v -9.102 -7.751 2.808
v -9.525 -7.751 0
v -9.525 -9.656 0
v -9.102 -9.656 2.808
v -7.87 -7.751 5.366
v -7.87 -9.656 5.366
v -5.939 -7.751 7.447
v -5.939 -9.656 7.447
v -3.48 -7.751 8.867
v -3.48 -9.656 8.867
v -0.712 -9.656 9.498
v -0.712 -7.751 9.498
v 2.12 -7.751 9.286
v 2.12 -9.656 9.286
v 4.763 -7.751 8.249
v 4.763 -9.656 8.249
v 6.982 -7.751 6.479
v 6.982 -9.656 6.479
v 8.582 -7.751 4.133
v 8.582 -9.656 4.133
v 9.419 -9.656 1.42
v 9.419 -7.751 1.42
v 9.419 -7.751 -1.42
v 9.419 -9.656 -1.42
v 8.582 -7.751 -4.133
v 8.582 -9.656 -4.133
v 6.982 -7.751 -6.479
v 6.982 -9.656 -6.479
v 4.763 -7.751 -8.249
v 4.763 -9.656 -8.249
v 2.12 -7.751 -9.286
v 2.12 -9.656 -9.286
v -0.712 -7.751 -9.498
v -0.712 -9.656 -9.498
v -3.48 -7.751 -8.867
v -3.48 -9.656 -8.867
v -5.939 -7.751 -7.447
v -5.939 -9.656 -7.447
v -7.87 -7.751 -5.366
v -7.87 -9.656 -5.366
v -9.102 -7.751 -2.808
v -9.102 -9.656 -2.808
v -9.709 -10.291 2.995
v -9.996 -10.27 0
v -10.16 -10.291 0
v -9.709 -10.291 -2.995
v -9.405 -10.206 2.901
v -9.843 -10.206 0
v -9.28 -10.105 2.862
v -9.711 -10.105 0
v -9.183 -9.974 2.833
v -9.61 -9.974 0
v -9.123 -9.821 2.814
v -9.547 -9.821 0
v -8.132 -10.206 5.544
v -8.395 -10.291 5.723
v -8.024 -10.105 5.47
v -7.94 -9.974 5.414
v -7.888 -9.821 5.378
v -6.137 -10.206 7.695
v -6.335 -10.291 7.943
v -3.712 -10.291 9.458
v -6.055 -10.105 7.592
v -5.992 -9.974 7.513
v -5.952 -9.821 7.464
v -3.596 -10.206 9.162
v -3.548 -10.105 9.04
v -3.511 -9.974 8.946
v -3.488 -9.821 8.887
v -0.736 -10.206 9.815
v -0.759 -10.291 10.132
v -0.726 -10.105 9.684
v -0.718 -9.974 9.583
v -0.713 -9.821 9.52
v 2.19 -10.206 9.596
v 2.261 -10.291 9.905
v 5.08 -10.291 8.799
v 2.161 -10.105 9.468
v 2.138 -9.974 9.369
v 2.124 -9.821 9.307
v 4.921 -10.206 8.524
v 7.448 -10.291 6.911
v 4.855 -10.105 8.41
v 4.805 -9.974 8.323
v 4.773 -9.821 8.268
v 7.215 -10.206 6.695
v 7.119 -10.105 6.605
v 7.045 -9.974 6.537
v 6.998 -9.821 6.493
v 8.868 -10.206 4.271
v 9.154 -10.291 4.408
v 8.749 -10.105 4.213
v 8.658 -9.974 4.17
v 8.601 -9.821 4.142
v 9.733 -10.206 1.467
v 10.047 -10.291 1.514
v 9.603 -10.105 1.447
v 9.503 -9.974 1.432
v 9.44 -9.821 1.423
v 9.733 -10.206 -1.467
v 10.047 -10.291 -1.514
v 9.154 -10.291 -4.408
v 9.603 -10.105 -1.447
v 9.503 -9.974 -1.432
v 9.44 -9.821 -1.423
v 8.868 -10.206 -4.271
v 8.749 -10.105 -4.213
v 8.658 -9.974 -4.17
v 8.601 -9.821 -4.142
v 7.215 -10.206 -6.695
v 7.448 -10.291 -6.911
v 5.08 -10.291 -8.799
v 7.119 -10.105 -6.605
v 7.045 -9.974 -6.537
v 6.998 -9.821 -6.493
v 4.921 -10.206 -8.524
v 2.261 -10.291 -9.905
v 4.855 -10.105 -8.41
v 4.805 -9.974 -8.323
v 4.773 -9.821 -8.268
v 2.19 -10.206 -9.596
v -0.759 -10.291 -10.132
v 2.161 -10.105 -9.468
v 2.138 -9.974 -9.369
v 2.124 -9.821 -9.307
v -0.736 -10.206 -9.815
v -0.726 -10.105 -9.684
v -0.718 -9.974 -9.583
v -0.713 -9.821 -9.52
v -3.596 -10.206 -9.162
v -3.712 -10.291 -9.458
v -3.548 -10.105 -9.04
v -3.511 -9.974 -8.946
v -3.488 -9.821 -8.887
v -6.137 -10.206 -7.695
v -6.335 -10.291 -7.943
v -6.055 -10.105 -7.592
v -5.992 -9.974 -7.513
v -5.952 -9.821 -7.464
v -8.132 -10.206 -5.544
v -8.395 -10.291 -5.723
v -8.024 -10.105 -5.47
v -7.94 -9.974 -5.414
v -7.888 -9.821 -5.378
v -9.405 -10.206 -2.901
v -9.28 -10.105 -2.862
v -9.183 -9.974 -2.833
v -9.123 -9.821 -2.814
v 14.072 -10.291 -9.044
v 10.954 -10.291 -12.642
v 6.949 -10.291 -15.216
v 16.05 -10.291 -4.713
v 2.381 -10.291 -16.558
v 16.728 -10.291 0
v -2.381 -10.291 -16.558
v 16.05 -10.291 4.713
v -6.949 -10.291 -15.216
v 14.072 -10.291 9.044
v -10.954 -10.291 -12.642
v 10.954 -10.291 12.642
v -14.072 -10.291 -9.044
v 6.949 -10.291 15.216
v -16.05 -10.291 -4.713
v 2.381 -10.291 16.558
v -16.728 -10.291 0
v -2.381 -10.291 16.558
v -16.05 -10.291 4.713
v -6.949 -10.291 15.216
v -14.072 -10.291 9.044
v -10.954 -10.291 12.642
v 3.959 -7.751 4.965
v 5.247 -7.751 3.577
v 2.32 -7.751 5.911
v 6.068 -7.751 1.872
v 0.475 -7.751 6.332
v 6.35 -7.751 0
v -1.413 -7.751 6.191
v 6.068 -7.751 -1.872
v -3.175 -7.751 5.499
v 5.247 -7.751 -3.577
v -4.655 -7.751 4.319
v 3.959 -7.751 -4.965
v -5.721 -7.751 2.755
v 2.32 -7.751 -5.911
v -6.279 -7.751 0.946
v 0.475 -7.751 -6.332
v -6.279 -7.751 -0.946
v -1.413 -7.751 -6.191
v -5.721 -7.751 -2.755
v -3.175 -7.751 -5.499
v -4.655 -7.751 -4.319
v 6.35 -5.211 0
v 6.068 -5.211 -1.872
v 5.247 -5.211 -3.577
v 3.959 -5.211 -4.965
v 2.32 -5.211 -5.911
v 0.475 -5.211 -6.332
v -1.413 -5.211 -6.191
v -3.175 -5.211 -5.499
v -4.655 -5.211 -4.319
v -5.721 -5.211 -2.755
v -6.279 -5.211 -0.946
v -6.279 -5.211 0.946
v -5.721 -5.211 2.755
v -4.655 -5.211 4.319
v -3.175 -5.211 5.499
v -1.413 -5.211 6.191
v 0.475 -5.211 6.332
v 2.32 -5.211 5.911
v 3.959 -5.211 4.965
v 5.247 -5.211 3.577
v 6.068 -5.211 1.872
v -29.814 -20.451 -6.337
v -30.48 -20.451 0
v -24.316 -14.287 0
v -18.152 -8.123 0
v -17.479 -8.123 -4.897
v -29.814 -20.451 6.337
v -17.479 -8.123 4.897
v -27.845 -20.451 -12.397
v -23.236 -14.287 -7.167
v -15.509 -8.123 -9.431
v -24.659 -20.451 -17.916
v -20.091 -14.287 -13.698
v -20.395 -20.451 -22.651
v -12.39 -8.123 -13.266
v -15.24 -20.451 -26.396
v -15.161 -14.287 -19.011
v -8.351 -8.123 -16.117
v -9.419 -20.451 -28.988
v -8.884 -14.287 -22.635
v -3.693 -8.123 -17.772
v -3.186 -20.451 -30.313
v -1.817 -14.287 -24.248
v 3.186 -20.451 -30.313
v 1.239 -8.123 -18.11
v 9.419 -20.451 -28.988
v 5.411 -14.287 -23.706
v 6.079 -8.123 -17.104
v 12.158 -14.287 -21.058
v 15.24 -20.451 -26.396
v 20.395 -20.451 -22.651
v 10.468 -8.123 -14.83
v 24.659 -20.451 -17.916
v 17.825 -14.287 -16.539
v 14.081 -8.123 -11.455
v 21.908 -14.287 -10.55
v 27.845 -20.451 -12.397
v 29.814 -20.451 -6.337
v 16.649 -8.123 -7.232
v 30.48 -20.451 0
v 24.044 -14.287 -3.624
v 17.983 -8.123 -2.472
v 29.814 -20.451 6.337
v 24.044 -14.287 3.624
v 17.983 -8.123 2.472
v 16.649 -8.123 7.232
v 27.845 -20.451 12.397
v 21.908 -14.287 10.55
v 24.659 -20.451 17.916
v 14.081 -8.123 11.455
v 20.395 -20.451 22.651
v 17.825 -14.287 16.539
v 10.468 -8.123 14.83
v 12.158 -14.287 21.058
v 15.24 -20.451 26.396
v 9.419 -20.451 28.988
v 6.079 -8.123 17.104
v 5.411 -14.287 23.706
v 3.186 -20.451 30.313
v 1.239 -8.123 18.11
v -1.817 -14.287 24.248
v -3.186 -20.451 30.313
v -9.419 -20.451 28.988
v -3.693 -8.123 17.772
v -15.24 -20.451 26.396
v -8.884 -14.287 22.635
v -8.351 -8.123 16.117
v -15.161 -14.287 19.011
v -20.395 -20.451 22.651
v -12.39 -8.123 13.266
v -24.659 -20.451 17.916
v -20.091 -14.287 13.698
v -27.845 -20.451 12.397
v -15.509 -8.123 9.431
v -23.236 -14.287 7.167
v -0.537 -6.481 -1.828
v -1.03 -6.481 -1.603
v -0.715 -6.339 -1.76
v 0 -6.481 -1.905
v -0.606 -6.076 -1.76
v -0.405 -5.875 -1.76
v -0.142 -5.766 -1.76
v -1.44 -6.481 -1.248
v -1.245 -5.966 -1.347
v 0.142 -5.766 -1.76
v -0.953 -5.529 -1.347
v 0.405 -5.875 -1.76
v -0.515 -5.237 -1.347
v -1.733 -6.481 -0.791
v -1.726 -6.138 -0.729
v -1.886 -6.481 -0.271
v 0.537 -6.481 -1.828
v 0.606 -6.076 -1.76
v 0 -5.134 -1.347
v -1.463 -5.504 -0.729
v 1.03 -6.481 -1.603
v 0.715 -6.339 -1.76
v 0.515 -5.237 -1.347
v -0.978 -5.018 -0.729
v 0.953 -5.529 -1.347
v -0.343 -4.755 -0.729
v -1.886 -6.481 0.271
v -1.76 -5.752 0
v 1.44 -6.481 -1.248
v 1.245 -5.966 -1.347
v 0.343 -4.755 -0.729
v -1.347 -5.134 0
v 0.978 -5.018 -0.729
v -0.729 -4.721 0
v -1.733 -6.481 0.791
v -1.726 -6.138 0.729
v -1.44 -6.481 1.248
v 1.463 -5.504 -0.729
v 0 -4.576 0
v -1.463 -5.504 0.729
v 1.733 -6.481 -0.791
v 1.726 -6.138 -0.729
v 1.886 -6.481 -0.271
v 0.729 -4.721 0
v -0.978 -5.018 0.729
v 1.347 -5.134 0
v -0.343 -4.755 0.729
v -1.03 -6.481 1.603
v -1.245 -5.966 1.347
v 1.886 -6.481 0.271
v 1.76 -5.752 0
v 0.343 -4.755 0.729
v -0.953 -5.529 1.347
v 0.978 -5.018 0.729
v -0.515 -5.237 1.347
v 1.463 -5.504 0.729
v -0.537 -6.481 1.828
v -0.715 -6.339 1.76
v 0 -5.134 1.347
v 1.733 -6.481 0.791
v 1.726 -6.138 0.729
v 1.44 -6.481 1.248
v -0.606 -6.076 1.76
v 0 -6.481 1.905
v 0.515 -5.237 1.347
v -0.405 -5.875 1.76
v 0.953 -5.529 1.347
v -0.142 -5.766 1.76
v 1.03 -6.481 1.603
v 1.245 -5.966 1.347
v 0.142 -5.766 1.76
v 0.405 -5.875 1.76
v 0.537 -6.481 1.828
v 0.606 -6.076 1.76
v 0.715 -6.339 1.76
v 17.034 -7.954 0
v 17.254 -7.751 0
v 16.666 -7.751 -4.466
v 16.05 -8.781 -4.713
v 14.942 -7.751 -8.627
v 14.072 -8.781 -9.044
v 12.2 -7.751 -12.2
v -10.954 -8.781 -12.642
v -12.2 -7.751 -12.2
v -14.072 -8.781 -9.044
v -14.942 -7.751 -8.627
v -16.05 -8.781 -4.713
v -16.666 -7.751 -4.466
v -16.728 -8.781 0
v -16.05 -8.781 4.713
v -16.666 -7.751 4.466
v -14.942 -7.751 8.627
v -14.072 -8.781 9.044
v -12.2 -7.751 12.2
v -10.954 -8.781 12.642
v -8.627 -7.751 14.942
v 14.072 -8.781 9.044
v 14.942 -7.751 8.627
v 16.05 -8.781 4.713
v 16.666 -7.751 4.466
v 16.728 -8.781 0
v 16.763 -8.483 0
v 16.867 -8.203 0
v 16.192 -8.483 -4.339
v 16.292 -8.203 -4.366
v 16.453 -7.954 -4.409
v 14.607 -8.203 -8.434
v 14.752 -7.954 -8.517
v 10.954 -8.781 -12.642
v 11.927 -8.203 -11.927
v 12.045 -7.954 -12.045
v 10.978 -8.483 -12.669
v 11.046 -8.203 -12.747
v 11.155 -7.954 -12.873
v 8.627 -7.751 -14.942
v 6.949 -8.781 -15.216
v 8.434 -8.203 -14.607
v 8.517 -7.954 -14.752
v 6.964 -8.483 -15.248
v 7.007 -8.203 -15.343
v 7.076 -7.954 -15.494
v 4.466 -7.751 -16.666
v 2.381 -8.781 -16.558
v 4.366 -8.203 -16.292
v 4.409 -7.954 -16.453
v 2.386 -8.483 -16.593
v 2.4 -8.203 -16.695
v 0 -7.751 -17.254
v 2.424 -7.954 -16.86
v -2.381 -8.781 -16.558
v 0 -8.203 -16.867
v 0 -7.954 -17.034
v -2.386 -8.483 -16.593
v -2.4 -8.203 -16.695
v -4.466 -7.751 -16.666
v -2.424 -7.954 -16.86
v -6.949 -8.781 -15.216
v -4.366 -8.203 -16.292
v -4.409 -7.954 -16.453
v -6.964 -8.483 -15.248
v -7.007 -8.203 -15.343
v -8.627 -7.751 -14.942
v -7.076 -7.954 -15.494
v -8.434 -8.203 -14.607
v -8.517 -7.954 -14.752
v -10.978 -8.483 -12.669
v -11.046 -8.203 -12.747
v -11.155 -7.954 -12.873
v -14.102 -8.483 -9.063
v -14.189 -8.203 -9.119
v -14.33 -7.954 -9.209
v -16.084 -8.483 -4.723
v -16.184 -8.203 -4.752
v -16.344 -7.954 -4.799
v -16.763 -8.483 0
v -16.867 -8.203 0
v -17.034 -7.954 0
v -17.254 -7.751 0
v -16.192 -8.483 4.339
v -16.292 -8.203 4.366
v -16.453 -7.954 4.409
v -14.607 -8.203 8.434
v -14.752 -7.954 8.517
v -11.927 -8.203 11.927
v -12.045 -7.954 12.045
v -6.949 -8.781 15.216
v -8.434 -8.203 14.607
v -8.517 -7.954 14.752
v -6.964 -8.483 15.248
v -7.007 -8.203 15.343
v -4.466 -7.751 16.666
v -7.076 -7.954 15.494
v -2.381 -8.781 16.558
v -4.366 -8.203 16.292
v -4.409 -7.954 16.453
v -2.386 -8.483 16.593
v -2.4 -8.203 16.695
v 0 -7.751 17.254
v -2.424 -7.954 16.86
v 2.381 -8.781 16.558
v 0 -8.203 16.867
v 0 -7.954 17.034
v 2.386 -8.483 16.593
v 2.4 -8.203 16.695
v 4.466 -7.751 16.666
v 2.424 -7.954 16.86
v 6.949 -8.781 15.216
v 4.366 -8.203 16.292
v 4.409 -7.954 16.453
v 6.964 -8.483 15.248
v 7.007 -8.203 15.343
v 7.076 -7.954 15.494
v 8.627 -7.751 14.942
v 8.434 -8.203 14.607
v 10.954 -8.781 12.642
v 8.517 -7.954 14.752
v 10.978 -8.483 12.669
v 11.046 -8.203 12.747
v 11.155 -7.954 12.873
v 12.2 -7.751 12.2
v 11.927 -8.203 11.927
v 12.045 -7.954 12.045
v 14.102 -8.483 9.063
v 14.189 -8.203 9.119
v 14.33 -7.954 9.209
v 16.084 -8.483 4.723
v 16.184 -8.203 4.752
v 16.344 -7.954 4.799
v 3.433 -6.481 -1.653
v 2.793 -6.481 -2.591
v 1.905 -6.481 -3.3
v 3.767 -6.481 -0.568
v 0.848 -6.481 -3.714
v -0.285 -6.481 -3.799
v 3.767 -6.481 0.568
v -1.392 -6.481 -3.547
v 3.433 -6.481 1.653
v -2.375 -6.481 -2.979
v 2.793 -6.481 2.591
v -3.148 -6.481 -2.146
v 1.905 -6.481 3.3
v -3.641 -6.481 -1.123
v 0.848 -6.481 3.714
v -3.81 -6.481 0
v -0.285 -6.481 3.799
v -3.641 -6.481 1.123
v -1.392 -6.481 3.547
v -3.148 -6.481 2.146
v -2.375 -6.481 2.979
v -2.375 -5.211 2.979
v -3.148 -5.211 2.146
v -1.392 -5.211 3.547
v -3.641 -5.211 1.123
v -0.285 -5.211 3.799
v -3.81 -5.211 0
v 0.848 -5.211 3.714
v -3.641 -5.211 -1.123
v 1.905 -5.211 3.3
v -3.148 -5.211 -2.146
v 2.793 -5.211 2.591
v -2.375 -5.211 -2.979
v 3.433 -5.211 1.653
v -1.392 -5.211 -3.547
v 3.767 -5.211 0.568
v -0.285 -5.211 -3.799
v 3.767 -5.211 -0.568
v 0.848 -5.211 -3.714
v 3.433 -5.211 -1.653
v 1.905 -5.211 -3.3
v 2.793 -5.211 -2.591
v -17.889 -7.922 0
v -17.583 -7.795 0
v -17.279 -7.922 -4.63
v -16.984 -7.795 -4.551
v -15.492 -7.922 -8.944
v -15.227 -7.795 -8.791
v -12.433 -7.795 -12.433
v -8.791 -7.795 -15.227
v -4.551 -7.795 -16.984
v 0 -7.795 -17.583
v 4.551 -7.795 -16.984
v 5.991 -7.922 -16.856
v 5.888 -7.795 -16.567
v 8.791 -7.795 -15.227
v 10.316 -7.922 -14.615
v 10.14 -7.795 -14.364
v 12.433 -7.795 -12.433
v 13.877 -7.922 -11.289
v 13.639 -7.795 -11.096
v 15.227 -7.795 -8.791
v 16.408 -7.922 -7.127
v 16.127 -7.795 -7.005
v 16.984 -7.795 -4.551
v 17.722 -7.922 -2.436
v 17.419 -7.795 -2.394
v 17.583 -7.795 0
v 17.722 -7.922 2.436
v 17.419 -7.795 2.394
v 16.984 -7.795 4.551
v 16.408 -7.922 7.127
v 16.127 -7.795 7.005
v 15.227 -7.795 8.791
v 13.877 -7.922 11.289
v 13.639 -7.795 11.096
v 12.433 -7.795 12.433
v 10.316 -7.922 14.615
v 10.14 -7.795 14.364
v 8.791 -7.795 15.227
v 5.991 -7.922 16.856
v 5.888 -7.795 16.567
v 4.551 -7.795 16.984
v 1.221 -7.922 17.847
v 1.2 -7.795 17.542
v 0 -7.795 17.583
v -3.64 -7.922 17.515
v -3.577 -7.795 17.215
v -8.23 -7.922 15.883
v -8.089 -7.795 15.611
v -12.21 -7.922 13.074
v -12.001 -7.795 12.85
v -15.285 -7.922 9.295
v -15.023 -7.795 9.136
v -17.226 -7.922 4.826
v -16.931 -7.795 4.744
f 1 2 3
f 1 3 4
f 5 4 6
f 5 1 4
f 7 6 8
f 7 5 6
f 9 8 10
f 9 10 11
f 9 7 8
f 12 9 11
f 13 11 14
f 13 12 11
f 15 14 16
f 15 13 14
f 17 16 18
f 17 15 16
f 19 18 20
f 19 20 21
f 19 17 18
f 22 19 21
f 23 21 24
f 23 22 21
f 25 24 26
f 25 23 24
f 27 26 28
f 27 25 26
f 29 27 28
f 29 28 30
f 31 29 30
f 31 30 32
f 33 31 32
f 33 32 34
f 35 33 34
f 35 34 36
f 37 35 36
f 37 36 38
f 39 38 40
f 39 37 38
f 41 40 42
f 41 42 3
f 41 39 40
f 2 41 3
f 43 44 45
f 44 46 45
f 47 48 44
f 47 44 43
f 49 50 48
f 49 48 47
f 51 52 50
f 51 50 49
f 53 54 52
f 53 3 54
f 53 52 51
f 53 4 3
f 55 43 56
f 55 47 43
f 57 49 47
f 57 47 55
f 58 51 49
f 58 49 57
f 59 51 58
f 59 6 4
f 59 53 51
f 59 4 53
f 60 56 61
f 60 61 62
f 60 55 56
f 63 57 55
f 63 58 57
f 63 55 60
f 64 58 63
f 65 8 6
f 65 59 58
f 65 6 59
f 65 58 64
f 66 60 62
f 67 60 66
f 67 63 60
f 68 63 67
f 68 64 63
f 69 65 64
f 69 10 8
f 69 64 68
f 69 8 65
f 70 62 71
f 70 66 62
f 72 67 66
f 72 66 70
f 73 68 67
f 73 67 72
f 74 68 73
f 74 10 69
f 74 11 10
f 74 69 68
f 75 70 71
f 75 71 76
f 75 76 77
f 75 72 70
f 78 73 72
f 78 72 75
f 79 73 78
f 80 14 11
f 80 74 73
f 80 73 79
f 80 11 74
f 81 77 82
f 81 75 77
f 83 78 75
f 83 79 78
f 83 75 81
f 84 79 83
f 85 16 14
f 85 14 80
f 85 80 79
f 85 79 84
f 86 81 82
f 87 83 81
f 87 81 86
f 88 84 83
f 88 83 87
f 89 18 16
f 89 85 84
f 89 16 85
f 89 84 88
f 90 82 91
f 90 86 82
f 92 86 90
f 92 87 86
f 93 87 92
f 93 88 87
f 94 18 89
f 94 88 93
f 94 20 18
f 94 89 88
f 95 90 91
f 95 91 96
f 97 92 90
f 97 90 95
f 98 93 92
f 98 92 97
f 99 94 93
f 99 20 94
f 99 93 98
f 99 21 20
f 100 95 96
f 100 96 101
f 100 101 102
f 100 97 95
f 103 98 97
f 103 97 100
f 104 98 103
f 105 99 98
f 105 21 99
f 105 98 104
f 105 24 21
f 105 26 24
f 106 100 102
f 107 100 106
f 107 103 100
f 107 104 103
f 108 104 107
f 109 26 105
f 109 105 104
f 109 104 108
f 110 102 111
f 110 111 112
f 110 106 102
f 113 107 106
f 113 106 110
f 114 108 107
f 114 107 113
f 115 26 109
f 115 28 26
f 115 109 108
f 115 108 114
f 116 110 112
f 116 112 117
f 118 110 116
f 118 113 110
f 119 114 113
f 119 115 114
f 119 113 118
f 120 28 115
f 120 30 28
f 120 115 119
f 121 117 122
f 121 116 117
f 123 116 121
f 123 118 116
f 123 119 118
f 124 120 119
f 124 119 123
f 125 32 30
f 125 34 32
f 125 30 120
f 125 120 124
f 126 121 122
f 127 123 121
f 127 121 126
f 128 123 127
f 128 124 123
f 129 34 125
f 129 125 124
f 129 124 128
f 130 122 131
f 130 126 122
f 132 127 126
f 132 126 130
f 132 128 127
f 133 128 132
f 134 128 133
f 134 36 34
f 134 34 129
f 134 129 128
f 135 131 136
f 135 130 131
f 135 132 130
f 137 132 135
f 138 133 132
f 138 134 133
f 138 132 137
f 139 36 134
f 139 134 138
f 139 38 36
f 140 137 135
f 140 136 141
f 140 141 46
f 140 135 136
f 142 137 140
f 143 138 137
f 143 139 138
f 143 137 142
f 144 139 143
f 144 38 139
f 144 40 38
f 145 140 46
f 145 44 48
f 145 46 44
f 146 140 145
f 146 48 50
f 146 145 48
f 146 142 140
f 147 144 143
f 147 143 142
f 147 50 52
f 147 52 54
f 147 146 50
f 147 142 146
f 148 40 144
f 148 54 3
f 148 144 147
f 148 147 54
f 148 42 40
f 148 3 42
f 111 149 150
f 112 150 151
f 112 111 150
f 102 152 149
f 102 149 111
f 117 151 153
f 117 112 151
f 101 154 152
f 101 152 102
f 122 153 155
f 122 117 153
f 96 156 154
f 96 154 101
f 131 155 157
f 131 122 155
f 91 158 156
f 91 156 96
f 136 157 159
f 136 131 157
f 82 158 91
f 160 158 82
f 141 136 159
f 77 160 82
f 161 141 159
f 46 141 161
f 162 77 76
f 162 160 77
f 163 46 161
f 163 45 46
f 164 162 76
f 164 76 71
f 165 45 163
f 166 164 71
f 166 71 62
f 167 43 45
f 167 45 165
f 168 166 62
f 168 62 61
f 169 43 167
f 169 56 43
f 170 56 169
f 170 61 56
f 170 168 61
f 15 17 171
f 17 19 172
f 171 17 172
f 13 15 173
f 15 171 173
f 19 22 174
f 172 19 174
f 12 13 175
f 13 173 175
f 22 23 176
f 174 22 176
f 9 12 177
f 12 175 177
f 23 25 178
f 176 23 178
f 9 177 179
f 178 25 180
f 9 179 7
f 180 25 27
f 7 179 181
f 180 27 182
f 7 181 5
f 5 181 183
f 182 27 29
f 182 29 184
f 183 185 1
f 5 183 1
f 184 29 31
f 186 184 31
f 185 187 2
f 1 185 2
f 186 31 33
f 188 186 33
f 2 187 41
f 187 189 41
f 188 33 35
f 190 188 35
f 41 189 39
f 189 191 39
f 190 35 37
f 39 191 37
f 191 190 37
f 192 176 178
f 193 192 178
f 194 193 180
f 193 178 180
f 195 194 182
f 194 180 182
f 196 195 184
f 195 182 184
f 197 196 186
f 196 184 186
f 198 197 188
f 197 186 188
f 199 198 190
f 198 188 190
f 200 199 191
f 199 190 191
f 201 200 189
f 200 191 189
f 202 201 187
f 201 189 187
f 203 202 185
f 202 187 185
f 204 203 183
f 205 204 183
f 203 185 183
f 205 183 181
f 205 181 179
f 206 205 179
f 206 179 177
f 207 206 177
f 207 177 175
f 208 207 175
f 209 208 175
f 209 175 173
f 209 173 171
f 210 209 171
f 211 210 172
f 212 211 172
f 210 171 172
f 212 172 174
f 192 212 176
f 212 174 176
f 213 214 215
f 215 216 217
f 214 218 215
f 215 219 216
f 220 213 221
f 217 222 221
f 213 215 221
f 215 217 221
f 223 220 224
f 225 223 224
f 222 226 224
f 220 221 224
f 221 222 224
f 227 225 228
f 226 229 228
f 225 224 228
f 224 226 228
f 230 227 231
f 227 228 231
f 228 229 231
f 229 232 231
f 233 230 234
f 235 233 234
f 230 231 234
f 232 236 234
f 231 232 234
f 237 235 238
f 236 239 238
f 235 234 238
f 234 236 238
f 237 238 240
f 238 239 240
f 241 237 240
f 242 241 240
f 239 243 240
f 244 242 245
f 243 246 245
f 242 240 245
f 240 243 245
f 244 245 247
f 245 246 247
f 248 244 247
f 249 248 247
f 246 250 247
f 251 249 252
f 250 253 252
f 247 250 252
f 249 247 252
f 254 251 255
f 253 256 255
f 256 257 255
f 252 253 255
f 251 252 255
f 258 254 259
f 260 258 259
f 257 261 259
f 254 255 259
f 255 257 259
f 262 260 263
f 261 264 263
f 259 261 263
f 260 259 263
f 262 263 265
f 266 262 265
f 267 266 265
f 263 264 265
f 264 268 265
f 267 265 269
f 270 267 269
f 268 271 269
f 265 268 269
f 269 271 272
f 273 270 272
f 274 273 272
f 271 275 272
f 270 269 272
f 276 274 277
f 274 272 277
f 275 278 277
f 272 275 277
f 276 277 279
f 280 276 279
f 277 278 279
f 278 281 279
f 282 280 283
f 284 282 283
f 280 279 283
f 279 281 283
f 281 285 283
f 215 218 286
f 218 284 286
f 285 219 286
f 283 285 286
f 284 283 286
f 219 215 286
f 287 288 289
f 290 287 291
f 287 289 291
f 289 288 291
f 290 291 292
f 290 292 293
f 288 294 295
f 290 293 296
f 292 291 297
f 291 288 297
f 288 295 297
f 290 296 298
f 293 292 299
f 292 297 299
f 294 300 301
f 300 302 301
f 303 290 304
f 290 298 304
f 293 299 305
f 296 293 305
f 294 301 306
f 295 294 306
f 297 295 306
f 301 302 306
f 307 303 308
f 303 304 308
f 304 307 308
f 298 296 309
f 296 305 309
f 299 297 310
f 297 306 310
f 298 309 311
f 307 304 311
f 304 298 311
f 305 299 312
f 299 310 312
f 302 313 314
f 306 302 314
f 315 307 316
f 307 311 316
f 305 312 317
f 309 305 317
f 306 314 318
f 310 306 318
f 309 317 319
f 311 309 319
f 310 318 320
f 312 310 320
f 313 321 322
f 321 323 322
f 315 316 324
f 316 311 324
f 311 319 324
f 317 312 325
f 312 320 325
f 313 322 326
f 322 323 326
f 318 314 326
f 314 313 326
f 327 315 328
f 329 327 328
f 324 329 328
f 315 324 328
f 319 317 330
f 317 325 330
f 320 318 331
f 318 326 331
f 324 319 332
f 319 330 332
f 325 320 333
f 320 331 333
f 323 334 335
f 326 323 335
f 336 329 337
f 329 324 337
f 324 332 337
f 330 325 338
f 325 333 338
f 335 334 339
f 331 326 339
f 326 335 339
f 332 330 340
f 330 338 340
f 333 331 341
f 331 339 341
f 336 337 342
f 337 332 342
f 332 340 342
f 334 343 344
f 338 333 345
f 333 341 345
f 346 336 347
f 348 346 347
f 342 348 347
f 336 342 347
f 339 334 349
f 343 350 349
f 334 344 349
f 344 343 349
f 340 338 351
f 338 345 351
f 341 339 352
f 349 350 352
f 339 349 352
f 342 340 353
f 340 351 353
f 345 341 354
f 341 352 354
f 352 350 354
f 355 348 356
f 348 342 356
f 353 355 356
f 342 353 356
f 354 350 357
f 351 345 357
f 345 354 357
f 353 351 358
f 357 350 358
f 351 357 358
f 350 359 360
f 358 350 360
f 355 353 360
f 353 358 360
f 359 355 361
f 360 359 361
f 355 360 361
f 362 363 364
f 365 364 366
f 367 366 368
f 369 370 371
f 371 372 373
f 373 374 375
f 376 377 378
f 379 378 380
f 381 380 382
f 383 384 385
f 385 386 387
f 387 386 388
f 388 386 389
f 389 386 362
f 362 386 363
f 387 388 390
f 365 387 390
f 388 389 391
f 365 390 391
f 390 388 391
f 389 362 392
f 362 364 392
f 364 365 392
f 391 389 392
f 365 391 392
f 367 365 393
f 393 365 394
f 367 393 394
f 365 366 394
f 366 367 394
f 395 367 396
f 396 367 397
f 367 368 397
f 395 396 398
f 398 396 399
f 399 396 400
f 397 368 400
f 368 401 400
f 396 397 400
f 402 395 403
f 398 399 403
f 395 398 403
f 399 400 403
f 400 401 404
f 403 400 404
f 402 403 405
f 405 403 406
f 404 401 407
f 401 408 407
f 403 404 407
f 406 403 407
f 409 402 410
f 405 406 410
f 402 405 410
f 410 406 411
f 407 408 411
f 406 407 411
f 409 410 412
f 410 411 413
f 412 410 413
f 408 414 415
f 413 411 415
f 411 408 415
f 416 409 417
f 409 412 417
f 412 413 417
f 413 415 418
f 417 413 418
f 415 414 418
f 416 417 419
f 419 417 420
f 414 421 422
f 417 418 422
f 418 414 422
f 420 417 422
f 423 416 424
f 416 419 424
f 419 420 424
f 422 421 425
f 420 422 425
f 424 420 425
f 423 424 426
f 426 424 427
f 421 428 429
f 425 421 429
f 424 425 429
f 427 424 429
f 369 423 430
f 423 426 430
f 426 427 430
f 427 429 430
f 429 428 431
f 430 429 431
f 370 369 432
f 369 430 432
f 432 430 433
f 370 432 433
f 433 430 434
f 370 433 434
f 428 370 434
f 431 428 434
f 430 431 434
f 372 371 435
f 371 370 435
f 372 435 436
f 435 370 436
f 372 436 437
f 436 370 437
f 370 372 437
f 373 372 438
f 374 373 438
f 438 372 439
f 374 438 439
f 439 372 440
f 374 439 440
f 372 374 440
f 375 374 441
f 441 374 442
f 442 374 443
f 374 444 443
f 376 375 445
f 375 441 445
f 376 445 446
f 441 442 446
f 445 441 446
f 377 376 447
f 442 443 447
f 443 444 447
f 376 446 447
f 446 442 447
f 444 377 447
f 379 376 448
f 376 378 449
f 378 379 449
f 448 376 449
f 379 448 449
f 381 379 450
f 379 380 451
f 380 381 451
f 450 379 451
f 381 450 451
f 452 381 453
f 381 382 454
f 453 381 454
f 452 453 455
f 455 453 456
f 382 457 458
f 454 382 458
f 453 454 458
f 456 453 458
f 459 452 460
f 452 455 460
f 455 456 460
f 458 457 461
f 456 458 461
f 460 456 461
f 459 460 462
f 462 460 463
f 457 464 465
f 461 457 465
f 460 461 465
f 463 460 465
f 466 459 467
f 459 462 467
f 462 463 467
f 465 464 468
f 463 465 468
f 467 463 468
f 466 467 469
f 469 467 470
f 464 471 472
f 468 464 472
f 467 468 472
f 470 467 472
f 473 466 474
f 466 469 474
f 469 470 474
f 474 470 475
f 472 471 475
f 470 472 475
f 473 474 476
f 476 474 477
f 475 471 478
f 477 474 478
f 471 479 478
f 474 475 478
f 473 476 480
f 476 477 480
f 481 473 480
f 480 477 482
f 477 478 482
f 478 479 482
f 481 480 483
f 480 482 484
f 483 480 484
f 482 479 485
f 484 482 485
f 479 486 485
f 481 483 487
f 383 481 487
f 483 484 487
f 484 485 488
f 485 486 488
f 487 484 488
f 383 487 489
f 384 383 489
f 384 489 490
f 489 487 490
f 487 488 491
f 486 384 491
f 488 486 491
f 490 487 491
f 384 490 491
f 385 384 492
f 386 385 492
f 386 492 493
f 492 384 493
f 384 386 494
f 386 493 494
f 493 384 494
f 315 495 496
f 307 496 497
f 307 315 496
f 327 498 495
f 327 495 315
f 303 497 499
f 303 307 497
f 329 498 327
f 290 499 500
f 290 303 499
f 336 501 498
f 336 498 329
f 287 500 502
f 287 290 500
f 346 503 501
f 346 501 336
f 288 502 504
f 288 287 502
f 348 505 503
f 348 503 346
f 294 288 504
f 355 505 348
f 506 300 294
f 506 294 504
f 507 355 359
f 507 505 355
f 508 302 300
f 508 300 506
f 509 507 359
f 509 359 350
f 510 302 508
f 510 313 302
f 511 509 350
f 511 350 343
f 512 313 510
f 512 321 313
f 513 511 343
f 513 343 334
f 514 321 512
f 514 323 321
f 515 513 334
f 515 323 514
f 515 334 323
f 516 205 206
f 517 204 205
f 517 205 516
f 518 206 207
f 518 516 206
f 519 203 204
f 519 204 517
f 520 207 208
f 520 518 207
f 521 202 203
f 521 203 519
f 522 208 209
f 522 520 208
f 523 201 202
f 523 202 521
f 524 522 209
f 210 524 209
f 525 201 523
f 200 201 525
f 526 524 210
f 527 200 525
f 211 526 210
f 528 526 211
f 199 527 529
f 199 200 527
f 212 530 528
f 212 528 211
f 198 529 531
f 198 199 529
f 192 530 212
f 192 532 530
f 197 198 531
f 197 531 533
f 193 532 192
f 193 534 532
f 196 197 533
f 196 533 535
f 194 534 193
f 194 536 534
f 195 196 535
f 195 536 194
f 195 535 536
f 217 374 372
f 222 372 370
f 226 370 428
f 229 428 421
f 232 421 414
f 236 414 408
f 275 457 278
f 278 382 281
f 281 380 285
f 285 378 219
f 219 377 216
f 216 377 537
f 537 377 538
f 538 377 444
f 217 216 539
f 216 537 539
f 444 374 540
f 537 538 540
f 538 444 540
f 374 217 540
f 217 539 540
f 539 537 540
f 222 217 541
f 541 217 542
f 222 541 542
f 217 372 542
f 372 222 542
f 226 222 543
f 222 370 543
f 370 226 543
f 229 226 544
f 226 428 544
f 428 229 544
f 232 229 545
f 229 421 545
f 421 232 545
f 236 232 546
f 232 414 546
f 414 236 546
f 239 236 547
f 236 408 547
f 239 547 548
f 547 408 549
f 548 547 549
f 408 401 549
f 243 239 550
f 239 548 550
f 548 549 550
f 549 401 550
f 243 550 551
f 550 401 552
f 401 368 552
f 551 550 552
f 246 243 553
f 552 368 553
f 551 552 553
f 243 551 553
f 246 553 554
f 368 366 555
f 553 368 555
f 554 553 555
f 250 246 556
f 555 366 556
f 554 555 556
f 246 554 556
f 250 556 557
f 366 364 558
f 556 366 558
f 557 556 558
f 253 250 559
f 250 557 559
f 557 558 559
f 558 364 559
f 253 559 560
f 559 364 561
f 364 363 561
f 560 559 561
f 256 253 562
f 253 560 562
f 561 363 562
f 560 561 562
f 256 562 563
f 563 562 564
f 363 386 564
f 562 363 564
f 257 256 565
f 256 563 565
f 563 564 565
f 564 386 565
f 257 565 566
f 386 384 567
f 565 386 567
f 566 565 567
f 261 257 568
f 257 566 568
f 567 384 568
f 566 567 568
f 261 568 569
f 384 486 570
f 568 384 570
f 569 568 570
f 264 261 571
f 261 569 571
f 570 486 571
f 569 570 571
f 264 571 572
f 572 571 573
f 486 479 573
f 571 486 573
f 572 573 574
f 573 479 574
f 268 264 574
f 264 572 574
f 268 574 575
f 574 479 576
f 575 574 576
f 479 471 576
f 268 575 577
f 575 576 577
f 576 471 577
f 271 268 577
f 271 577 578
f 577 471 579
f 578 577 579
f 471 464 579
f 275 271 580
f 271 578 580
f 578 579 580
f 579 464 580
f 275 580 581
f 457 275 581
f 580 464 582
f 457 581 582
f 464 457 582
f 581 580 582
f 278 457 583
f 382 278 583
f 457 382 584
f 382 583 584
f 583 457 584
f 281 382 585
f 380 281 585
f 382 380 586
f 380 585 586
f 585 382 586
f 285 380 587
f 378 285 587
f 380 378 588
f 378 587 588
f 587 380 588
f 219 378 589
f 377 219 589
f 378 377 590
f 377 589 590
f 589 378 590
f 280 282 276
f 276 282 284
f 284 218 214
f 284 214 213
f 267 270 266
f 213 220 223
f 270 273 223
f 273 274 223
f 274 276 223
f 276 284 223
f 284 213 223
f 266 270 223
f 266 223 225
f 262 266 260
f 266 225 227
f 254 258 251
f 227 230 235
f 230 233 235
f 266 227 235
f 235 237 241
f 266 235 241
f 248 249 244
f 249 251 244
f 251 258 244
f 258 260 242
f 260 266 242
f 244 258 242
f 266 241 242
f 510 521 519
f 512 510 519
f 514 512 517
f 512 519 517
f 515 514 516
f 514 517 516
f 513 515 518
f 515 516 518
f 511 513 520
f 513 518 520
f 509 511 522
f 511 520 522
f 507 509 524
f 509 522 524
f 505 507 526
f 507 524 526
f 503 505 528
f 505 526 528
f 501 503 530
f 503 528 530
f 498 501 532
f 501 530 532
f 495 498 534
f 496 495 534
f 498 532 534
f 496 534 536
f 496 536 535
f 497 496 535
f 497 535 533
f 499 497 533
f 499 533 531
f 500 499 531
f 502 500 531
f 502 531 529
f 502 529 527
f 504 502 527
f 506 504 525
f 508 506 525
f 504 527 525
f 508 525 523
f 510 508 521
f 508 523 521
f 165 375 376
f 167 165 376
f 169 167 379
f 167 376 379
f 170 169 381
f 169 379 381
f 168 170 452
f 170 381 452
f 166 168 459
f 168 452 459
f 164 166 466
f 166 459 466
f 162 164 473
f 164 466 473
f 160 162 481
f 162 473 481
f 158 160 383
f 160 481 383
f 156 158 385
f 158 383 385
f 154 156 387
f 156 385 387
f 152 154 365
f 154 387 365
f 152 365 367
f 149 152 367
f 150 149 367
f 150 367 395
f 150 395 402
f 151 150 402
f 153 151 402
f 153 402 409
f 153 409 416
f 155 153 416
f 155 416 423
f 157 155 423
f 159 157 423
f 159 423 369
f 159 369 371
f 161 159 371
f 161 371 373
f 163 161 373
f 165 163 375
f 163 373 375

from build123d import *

# Parameters (mm, degrees)
FILLET1_R           = 2.54
SKETCH3_R           = 33.455795103
SKETCH3_R_2         = 19.05
CUT_EXTRUDE1_DEPTH  = 5.08
SKETCH4_R           = 12.7
BOSS_EXTRUDE1_DEPTH = 5.08
SKETCH5_R           = 7.62
CUT_EXTRUDE2_DEPTH  = 2.54
FILLET6_R           = 1.27
REVOLVE2_ANGLE      = 180
SCALE1_SCALE        = 0.5


with BuildPart() as part:
    # Sketch1 → Revolve1 (revolve)
    with BuildSketch(Plane.XY, mode=Mode.PRIVATE) as revolve1_sk:
        Polygon((0, 0), (0, -25.4), (60.96, -25.4), (35.56, 0), align=None)
    revolve(revolve1_sk.sketch.rotate(Axis((0, 0, 0), (0, -1, 0)), 180), axis=Axis((0, 0, 0), (0, -1, 0)))

    # Fillet1
    fillet1_edges = [part.edges().sort_by_distance(p)[0] for p in [
        (35.56, 0, 0),
    ]]
    fillet(fillet1_edges, radius=FILLET1_R)

    # Sketch3 → Cut-Extrude1 (cut)
    with BuildSketch(Plane(origin=(0, 0, 0), x_dir=(1, 0, 0), z_dir=(0, 1, 0))):
        with Locations(Location((0, 0, 0), (0, 0, 180))):
            Circle(SKETCH3_R)
        with Locations(Location((0, 0, 0), (0, 0, 180))):
            Circle(SKETCH3_R_2, mode=Mode.SUBTRACT)
    extrude(amount=-CUT_EXTRUDE1_DEPTH, mode=Mode.SUBTRACT)

    # Fillet4: read off the stored shape, not the designer's step
    # Fillet4 outline → Fillet4 (revolve, cut)
    with BuildSketch(Plane.XY):
        with BuildLine():
            ThreePointArc((33.455795103, -2.058582249), (33.73406349, -0.902654003), (34.507897552, 0))
            Line((34.507897552, 0), (33.455795103, 0))
            Line((33.455795103, 0), (33.455795103, -2.058582249))
        make_face()
    revolve(axis=Axis((0, 0, 0), (0, 1, 0)), mode=Mode.SUBTRACT)

    # Sketch4 → Boss-Extrude1 (add)
    with BuildSketch(Plane(origin=(0, 0, 0), x_dir=(1, 0, 0), z_dir=(0, 1, 0))):
        Circle(SKETCH4_R)
    extrude(amount=BOSS_EXTRUDE1_DEPTH)

    # Sketch5 → Cut-Extrude2 (cut)
    with BuildSketch(Plane(origin=(0, 5.08, 0), x_dir=(1, 0, 0), z_dir=(0, 1, 0))):
        with Locations(Location((0, 0, 0), (0, 0, 180))):
            Circle(SKETCH5_R)
    extrude(amount=-CUT_EXTRUDE2_DEPTH, mode=Mode.SUBTRACT)

    # Fillet6
    fillet6_edges = [part.edges().sort_by_distance(p)[0] for p in [
        (19.05, -5.08, 0),
    ]]
    fillet(fillet6_edges, radius=FILLET6_R)

    # Sketch6 → Revolve2 (revolve)
    with BuildSketch(Plane(origin=(0, 2.54, 0), x_dir=(1, 0, 0), z_dir=(0, 1, 0))):
        with BuildLine():
            Line((0, -3.81), (0, 3.81))
            ThreePointArc((0, 3.81), (-3.81, 0), (0, -3.81))
        make_face()
    revolve(axis=Axis((0, 2.54, 3.81), (0, 0, -1)), revolution_arc=REVOLVE2_ANGLE)


with BuildPart() as part_1:
    # Scale1: scaled about (0, -15.502710002, 0)
    add(part.part.scale(SCALE1_SCALE).moved(Location((0, -7.751355001, 0))))


solid = part_1.part
